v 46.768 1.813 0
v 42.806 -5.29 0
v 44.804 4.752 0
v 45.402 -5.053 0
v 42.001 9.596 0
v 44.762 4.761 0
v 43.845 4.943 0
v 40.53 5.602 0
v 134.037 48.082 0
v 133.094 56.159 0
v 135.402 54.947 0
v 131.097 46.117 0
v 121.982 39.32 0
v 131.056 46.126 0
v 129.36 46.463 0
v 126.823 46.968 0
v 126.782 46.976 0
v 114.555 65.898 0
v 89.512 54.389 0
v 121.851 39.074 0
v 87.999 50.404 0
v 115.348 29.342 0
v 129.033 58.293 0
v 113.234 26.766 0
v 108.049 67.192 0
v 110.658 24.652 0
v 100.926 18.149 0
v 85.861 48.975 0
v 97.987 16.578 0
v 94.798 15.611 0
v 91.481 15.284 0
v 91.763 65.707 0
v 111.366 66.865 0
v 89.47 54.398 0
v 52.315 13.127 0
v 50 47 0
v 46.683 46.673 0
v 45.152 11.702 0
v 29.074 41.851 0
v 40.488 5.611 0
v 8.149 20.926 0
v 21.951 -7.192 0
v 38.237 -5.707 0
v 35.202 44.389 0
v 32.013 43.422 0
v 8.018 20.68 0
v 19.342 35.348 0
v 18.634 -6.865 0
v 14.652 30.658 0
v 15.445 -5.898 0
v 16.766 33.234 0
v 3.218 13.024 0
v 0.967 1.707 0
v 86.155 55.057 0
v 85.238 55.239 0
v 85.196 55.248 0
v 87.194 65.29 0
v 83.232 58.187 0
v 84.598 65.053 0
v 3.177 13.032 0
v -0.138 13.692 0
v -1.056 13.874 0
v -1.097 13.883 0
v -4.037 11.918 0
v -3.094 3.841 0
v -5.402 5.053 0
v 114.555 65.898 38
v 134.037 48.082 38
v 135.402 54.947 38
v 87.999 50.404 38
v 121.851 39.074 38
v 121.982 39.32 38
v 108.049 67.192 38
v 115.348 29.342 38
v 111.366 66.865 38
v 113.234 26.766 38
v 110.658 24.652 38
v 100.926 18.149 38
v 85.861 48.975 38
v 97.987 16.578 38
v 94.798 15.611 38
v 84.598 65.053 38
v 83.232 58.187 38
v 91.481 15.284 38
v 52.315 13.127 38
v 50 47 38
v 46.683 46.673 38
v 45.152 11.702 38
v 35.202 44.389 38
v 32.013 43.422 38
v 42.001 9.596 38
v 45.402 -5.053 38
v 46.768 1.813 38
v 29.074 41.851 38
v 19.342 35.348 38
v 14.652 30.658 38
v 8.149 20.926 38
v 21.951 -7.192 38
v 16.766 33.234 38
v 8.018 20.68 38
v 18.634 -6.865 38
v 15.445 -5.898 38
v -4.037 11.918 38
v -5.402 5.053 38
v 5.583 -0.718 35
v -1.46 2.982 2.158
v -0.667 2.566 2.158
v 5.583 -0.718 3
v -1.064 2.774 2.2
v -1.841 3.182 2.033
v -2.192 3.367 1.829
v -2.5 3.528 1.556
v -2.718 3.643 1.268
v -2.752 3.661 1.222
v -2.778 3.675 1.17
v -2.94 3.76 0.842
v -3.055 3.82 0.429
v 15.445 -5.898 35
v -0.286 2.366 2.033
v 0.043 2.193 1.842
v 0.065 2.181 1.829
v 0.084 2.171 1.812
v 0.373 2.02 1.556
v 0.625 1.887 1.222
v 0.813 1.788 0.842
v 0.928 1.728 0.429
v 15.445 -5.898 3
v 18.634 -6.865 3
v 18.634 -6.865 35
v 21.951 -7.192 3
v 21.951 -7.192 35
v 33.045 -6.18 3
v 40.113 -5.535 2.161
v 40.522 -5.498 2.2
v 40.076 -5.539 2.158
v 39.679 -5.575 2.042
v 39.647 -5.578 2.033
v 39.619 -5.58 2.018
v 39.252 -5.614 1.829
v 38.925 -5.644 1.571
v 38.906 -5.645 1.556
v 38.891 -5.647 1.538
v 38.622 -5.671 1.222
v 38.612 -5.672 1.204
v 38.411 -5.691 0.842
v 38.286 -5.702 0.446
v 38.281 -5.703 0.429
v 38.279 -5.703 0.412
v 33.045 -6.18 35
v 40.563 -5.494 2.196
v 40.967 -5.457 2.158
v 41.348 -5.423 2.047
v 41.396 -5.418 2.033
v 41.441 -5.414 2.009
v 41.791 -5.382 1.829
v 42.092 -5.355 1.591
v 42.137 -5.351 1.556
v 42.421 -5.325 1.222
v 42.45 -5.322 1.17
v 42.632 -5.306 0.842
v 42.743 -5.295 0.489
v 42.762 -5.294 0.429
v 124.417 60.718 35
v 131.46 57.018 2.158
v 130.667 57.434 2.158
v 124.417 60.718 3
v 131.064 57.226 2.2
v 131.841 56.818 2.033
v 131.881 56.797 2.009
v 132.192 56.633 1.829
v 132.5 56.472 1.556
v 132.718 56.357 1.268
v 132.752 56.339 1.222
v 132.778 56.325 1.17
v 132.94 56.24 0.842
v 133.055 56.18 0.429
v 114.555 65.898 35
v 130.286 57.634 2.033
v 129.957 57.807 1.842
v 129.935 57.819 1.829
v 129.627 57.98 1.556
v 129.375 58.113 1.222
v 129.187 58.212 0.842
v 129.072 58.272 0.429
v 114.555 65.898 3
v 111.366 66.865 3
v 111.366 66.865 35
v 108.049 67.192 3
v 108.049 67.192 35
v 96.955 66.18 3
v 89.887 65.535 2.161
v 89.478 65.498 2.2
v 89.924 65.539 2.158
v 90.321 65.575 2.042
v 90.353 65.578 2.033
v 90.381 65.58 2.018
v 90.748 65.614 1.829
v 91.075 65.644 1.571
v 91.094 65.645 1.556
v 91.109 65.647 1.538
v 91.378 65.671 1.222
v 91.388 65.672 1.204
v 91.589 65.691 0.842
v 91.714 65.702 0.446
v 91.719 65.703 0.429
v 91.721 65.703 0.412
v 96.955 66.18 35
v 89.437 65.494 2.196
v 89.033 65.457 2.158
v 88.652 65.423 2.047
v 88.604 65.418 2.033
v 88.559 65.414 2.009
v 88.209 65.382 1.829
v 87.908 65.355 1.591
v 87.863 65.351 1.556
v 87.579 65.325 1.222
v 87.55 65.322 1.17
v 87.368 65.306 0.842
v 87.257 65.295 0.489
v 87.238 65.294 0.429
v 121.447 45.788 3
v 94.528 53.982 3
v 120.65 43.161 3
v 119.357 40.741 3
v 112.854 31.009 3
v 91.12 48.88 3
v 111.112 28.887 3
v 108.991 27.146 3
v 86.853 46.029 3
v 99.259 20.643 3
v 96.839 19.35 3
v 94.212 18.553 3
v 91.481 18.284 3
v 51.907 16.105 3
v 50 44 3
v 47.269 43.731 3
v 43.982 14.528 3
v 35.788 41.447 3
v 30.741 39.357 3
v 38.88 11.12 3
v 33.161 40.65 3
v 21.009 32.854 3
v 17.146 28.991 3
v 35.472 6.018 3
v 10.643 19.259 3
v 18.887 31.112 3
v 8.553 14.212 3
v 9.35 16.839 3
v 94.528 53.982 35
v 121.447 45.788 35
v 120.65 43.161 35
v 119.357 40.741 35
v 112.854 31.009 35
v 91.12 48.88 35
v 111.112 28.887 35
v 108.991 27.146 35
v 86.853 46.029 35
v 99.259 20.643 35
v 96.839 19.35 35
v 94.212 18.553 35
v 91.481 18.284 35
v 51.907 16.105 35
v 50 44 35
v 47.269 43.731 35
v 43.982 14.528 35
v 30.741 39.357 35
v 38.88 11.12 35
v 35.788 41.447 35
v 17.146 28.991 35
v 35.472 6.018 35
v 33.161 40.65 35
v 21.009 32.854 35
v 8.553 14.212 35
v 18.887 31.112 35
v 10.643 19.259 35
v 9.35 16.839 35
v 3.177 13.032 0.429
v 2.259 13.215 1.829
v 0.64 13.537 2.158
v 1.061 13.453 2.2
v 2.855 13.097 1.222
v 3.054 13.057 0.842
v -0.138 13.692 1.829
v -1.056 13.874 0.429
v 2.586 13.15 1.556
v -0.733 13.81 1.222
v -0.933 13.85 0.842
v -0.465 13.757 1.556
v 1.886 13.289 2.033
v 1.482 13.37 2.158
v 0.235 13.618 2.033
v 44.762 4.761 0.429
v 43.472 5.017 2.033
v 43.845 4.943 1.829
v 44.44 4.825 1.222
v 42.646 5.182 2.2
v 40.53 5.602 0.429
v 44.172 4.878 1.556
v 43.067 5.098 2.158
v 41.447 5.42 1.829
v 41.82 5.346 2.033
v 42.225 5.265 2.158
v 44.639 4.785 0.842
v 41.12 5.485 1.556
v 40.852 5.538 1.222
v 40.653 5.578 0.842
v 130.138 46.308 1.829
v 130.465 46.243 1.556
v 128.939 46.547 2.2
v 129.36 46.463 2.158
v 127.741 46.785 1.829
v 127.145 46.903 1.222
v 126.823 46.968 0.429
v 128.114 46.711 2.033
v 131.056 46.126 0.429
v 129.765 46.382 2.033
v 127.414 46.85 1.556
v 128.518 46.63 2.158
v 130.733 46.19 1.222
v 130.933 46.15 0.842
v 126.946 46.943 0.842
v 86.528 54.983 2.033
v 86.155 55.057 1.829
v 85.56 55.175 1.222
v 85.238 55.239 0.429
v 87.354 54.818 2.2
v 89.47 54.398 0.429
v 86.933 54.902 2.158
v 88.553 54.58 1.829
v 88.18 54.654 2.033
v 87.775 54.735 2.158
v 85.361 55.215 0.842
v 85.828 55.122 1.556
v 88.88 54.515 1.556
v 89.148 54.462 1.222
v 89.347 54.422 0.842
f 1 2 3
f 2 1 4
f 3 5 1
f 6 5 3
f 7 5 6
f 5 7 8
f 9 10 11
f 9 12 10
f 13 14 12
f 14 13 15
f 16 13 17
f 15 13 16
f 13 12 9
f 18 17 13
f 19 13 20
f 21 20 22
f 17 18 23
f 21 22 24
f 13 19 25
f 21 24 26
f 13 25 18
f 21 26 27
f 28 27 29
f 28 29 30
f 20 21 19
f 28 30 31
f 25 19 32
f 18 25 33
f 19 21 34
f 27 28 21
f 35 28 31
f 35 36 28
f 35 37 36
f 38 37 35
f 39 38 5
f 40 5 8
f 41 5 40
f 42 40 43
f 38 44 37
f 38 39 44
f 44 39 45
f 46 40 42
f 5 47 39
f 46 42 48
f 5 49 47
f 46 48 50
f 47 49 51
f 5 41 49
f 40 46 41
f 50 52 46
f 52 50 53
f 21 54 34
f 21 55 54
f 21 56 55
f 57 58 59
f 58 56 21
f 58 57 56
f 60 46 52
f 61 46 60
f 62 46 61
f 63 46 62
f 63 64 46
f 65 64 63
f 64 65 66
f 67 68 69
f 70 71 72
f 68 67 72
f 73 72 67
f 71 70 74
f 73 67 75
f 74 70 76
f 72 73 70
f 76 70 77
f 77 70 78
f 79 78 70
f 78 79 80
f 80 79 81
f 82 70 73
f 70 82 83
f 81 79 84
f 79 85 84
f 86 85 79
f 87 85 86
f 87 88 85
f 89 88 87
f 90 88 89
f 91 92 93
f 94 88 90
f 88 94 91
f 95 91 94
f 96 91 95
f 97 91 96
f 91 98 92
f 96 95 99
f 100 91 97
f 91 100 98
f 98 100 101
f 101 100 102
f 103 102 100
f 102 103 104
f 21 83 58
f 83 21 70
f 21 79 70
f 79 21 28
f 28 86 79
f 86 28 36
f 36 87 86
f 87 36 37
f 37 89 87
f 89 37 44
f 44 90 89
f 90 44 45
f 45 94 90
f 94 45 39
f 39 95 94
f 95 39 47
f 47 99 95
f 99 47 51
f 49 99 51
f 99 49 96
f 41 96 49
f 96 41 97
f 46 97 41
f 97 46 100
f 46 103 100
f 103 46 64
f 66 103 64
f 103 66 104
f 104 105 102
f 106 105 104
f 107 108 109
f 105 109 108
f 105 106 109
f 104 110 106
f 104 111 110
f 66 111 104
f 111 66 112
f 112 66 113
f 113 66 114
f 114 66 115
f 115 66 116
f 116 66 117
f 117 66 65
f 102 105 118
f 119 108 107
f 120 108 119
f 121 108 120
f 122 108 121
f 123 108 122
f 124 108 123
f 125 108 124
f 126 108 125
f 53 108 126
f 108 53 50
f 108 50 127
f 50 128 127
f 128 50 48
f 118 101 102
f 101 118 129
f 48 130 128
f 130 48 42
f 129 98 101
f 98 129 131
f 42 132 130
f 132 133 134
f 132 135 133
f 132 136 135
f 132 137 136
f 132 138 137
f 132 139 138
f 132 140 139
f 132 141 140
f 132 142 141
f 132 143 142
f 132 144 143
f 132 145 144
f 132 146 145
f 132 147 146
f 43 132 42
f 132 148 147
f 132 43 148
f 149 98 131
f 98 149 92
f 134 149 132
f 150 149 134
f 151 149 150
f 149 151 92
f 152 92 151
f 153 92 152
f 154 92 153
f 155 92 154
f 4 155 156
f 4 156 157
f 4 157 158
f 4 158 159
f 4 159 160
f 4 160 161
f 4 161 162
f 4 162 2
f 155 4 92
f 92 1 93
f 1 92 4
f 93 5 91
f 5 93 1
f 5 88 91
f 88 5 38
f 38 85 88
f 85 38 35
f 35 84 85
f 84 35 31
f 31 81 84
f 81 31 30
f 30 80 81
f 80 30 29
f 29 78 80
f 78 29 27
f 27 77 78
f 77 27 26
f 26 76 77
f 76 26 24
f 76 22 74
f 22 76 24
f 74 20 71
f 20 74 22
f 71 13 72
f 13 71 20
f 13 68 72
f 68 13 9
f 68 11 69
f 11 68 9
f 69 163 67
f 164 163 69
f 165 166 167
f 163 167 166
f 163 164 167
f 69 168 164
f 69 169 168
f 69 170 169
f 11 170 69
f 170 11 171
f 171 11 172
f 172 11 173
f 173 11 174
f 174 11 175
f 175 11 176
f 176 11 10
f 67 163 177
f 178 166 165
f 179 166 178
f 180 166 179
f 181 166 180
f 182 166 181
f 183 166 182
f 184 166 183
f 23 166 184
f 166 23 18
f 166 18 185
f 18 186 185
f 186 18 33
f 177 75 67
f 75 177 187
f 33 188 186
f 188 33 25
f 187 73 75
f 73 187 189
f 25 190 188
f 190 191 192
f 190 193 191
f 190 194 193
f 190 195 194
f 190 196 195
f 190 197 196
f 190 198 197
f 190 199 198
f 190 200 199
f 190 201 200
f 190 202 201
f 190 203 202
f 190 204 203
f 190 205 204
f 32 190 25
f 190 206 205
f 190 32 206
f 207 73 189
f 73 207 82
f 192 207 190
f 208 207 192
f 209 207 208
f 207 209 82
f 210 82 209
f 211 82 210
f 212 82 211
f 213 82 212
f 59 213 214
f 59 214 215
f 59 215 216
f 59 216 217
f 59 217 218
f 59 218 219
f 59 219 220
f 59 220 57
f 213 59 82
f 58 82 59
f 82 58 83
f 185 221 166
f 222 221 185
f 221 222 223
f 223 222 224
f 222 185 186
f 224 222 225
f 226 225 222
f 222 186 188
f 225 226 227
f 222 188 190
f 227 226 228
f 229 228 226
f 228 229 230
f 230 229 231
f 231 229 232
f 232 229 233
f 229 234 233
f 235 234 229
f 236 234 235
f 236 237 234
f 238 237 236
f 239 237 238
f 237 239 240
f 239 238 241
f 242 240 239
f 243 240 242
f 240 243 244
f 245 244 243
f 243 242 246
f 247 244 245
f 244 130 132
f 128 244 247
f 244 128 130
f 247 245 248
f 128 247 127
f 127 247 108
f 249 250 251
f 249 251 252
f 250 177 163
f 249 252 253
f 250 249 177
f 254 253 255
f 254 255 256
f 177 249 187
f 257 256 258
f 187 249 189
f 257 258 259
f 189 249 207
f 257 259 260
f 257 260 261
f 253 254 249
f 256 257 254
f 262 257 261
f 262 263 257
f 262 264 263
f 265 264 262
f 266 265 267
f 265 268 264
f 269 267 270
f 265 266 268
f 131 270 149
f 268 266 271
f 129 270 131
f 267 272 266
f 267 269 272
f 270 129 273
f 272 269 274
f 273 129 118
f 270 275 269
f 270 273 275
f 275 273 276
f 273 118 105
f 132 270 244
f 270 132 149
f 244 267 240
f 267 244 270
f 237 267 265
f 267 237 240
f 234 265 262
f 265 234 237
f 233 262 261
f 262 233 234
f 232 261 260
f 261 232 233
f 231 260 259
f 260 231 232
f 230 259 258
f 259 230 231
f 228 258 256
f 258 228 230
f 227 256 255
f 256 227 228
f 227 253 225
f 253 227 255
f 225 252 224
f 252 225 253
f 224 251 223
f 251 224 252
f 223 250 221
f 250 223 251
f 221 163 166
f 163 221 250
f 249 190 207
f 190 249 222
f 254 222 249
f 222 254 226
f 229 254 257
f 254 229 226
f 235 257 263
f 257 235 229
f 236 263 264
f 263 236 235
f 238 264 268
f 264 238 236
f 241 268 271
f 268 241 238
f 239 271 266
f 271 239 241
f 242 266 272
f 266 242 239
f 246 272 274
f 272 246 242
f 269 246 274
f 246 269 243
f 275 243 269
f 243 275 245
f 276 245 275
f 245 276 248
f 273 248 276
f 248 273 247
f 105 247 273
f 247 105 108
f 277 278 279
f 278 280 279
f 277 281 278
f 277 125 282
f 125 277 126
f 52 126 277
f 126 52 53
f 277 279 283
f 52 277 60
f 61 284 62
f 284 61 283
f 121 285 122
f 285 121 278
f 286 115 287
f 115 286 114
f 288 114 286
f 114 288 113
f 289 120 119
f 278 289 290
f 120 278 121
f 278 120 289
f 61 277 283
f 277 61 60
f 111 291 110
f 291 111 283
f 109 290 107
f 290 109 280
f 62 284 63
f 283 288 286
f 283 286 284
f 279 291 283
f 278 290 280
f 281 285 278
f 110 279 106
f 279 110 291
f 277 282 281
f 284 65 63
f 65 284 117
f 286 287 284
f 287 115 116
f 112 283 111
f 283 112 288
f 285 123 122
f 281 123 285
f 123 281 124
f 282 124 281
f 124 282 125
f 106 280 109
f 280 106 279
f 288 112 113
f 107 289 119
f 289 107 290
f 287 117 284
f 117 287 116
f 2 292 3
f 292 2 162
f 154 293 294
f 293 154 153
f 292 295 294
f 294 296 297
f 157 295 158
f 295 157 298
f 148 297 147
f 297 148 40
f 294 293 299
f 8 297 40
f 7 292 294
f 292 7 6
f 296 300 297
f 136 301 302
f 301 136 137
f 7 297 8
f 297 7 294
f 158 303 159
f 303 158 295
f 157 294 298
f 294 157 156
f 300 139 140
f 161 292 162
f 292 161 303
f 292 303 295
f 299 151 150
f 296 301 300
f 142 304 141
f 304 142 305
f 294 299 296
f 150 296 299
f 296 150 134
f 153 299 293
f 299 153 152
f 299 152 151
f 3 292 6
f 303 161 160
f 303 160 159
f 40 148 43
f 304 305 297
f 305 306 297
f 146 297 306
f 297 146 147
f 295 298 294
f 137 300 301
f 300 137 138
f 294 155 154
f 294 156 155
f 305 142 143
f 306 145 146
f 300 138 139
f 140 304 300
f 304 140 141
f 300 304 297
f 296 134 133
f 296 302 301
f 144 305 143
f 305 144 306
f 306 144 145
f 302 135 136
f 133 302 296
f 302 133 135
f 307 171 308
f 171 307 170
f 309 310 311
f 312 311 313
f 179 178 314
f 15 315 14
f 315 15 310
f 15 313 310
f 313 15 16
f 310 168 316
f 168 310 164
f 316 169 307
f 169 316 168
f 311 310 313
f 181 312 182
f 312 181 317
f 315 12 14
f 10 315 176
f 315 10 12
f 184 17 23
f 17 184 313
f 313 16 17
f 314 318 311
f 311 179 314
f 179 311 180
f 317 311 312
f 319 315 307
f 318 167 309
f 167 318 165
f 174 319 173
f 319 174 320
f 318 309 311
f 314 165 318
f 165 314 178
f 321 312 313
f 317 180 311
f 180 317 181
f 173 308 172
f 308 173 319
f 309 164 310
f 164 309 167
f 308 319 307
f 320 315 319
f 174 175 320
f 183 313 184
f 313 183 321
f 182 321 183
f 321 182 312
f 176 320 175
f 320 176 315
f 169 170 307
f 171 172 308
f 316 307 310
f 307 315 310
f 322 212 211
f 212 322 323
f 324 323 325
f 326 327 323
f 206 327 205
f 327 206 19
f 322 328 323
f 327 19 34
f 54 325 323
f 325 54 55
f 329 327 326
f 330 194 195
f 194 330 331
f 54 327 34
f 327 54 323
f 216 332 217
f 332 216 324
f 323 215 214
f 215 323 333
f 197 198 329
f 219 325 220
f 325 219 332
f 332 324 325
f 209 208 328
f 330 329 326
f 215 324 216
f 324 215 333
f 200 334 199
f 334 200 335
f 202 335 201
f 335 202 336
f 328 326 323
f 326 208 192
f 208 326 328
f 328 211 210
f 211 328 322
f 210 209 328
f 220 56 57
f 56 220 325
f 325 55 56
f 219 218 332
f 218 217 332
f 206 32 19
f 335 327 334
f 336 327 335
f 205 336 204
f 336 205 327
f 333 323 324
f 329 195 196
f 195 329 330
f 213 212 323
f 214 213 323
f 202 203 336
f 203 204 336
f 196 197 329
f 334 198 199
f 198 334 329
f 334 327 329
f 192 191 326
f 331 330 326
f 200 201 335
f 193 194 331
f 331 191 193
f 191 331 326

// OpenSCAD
$fn = 32;

// ----------------------------------------------------------------------
// Air duct: 34 mm duct, 3 mm wall, 38 mm across
// ----------------------------------------------------------------------

// --- parameters (mm) ---
duct_r = 17;              // duct core radius
duct_d = 34;              // duct core diameter
wall = 3;                 // duct wall thickness
height = 38;              // duct width (extrusion height)
port_r = 25.9;            // port flange half width
port_d = 51.8;            // port flange width
port_t = 7;               // port flange thickness
bolt_d = 4.4;             // port bolt holes
bolt_offset = 21.2;       // bolt hole offset from the port axis

difference() {
  /* outer hull chain: tube with a flat flange plate at every port */
  linear_extrude(height = 38) {
    hull() {
      polygon([[45.402, -5.053], [-5.402, 5.053], [-4.037, 11.918], [46.768, 1.813]]);
      translate([21.951, 9.808]) circle(r = 17);
    }
    hull() {
      translate([21.951, 9.808]) circle(r = 17);
      translate([22.284, 11.481]) circle(r = 17);
    }
    hull() {
      translate([22.284, 11.481]) circle(r = 17);
      translate([28.787, 21.213]) circle(r = 17);
    }
    hull() {
      translate([28.787, 21.213]) circle(r = 17);
      translate([38.519, 27.716]) circle(r = 17);
    }
    hull() {
      translate([38.519, 27.716]) circle(r = 17);
      translate([50, 30]) circle(r = 17);
    }
    hull() {
      translate([50, 30]) circle(r = 17);
      translate([91.481, 32.284]) circle(r = 17);
    }
    hull() {
      translate([91.481, 32.284]) circle(r = 17);
      translate([101.213, 38.787]) circle(r = 17);
    }
    hull() {
      translate([101.213, 38.787]) circle(r = 17);
      translate([107.716, 48.519]) circle(r = 17);
    }
    hull() {
      translate([107.716, 48.519]) circle(r = 17);
      translate([108.049, 50.192]) circle(r = 17);
    }
    hull() {
      translate([108.049, 50.192]) circle(r = 17);
      polygon([[84.598, 65.053], [135.402, 54.947], [134.037, 48.082], [83.232, 58.187]]);
    }
  }
  /* air passage: the same chain inset by the wall, 5 mm proud of the ports */
  translate([0, 0, 3]) linear_extrude(height = 32) {
    hull() {
      translate([19.025, -4.904]) circle(r = 14);
      translate([22.284, 11.481]) circle(r = 14);
    }
    hull() {
      translate([22.284, 11.481]) circle(r = 14);
      translate([28.787, 21.213]) circle(r = 14);
    }
    hull() {
      translate([28.787, 21.213]) circle(r = 14);
      translate([38.519, 27.716]) circle(r = 14);
    }
    hull() {
      translate([38.519, 27.716]) circle(r = 14);
      translate([50, 30]) circle(r = 14);
    }
    hull() {
      translate([50, 30]) circle(r = 14);
      translate([91.481, 32.284]) circle(r = 14);
    }
    hull() {
      translate([91.481, 32.284]) circle(r = 14);
      translate([101.213, 38.787]) circle(r = 14);
    }
    hull() {
      translate([101.213, 38.787]) circle(r = 14);
      translate([107.716, 48.519]) circle(r = 14);
    }
    hull() {
      translate([107.716, 48.519]) circle(r = 14);
      translate([110.975, 64.904]) circle(r = 14);
    }
  }
  translate([20, 0]) rotate([0, 0, -11.25]) translate([-21.2, -2.5]) rotate([-90, 0, 0]) cylinder(h = 12, d = 4.4);
  translate([20, 0]) rotate([0, 0, -11.25]) translate([21.2, -2.5]) rotate([-90, 0, 0]) cylinder(h = 12, d = 4.4);
  translate([110, 60]) rotate([0, 0, 168.75]) translate([-21.2, -2.5]) rotate([-90, 0, 0]) cylinder(h = 12, d = 4.4);
  translate([110, 60]) rotate([0, 0, 168.75]) translate([21.2, -2.5]) rotate([-90, 0, 0]) cylinder(h = 12, d = 4.4);
}
